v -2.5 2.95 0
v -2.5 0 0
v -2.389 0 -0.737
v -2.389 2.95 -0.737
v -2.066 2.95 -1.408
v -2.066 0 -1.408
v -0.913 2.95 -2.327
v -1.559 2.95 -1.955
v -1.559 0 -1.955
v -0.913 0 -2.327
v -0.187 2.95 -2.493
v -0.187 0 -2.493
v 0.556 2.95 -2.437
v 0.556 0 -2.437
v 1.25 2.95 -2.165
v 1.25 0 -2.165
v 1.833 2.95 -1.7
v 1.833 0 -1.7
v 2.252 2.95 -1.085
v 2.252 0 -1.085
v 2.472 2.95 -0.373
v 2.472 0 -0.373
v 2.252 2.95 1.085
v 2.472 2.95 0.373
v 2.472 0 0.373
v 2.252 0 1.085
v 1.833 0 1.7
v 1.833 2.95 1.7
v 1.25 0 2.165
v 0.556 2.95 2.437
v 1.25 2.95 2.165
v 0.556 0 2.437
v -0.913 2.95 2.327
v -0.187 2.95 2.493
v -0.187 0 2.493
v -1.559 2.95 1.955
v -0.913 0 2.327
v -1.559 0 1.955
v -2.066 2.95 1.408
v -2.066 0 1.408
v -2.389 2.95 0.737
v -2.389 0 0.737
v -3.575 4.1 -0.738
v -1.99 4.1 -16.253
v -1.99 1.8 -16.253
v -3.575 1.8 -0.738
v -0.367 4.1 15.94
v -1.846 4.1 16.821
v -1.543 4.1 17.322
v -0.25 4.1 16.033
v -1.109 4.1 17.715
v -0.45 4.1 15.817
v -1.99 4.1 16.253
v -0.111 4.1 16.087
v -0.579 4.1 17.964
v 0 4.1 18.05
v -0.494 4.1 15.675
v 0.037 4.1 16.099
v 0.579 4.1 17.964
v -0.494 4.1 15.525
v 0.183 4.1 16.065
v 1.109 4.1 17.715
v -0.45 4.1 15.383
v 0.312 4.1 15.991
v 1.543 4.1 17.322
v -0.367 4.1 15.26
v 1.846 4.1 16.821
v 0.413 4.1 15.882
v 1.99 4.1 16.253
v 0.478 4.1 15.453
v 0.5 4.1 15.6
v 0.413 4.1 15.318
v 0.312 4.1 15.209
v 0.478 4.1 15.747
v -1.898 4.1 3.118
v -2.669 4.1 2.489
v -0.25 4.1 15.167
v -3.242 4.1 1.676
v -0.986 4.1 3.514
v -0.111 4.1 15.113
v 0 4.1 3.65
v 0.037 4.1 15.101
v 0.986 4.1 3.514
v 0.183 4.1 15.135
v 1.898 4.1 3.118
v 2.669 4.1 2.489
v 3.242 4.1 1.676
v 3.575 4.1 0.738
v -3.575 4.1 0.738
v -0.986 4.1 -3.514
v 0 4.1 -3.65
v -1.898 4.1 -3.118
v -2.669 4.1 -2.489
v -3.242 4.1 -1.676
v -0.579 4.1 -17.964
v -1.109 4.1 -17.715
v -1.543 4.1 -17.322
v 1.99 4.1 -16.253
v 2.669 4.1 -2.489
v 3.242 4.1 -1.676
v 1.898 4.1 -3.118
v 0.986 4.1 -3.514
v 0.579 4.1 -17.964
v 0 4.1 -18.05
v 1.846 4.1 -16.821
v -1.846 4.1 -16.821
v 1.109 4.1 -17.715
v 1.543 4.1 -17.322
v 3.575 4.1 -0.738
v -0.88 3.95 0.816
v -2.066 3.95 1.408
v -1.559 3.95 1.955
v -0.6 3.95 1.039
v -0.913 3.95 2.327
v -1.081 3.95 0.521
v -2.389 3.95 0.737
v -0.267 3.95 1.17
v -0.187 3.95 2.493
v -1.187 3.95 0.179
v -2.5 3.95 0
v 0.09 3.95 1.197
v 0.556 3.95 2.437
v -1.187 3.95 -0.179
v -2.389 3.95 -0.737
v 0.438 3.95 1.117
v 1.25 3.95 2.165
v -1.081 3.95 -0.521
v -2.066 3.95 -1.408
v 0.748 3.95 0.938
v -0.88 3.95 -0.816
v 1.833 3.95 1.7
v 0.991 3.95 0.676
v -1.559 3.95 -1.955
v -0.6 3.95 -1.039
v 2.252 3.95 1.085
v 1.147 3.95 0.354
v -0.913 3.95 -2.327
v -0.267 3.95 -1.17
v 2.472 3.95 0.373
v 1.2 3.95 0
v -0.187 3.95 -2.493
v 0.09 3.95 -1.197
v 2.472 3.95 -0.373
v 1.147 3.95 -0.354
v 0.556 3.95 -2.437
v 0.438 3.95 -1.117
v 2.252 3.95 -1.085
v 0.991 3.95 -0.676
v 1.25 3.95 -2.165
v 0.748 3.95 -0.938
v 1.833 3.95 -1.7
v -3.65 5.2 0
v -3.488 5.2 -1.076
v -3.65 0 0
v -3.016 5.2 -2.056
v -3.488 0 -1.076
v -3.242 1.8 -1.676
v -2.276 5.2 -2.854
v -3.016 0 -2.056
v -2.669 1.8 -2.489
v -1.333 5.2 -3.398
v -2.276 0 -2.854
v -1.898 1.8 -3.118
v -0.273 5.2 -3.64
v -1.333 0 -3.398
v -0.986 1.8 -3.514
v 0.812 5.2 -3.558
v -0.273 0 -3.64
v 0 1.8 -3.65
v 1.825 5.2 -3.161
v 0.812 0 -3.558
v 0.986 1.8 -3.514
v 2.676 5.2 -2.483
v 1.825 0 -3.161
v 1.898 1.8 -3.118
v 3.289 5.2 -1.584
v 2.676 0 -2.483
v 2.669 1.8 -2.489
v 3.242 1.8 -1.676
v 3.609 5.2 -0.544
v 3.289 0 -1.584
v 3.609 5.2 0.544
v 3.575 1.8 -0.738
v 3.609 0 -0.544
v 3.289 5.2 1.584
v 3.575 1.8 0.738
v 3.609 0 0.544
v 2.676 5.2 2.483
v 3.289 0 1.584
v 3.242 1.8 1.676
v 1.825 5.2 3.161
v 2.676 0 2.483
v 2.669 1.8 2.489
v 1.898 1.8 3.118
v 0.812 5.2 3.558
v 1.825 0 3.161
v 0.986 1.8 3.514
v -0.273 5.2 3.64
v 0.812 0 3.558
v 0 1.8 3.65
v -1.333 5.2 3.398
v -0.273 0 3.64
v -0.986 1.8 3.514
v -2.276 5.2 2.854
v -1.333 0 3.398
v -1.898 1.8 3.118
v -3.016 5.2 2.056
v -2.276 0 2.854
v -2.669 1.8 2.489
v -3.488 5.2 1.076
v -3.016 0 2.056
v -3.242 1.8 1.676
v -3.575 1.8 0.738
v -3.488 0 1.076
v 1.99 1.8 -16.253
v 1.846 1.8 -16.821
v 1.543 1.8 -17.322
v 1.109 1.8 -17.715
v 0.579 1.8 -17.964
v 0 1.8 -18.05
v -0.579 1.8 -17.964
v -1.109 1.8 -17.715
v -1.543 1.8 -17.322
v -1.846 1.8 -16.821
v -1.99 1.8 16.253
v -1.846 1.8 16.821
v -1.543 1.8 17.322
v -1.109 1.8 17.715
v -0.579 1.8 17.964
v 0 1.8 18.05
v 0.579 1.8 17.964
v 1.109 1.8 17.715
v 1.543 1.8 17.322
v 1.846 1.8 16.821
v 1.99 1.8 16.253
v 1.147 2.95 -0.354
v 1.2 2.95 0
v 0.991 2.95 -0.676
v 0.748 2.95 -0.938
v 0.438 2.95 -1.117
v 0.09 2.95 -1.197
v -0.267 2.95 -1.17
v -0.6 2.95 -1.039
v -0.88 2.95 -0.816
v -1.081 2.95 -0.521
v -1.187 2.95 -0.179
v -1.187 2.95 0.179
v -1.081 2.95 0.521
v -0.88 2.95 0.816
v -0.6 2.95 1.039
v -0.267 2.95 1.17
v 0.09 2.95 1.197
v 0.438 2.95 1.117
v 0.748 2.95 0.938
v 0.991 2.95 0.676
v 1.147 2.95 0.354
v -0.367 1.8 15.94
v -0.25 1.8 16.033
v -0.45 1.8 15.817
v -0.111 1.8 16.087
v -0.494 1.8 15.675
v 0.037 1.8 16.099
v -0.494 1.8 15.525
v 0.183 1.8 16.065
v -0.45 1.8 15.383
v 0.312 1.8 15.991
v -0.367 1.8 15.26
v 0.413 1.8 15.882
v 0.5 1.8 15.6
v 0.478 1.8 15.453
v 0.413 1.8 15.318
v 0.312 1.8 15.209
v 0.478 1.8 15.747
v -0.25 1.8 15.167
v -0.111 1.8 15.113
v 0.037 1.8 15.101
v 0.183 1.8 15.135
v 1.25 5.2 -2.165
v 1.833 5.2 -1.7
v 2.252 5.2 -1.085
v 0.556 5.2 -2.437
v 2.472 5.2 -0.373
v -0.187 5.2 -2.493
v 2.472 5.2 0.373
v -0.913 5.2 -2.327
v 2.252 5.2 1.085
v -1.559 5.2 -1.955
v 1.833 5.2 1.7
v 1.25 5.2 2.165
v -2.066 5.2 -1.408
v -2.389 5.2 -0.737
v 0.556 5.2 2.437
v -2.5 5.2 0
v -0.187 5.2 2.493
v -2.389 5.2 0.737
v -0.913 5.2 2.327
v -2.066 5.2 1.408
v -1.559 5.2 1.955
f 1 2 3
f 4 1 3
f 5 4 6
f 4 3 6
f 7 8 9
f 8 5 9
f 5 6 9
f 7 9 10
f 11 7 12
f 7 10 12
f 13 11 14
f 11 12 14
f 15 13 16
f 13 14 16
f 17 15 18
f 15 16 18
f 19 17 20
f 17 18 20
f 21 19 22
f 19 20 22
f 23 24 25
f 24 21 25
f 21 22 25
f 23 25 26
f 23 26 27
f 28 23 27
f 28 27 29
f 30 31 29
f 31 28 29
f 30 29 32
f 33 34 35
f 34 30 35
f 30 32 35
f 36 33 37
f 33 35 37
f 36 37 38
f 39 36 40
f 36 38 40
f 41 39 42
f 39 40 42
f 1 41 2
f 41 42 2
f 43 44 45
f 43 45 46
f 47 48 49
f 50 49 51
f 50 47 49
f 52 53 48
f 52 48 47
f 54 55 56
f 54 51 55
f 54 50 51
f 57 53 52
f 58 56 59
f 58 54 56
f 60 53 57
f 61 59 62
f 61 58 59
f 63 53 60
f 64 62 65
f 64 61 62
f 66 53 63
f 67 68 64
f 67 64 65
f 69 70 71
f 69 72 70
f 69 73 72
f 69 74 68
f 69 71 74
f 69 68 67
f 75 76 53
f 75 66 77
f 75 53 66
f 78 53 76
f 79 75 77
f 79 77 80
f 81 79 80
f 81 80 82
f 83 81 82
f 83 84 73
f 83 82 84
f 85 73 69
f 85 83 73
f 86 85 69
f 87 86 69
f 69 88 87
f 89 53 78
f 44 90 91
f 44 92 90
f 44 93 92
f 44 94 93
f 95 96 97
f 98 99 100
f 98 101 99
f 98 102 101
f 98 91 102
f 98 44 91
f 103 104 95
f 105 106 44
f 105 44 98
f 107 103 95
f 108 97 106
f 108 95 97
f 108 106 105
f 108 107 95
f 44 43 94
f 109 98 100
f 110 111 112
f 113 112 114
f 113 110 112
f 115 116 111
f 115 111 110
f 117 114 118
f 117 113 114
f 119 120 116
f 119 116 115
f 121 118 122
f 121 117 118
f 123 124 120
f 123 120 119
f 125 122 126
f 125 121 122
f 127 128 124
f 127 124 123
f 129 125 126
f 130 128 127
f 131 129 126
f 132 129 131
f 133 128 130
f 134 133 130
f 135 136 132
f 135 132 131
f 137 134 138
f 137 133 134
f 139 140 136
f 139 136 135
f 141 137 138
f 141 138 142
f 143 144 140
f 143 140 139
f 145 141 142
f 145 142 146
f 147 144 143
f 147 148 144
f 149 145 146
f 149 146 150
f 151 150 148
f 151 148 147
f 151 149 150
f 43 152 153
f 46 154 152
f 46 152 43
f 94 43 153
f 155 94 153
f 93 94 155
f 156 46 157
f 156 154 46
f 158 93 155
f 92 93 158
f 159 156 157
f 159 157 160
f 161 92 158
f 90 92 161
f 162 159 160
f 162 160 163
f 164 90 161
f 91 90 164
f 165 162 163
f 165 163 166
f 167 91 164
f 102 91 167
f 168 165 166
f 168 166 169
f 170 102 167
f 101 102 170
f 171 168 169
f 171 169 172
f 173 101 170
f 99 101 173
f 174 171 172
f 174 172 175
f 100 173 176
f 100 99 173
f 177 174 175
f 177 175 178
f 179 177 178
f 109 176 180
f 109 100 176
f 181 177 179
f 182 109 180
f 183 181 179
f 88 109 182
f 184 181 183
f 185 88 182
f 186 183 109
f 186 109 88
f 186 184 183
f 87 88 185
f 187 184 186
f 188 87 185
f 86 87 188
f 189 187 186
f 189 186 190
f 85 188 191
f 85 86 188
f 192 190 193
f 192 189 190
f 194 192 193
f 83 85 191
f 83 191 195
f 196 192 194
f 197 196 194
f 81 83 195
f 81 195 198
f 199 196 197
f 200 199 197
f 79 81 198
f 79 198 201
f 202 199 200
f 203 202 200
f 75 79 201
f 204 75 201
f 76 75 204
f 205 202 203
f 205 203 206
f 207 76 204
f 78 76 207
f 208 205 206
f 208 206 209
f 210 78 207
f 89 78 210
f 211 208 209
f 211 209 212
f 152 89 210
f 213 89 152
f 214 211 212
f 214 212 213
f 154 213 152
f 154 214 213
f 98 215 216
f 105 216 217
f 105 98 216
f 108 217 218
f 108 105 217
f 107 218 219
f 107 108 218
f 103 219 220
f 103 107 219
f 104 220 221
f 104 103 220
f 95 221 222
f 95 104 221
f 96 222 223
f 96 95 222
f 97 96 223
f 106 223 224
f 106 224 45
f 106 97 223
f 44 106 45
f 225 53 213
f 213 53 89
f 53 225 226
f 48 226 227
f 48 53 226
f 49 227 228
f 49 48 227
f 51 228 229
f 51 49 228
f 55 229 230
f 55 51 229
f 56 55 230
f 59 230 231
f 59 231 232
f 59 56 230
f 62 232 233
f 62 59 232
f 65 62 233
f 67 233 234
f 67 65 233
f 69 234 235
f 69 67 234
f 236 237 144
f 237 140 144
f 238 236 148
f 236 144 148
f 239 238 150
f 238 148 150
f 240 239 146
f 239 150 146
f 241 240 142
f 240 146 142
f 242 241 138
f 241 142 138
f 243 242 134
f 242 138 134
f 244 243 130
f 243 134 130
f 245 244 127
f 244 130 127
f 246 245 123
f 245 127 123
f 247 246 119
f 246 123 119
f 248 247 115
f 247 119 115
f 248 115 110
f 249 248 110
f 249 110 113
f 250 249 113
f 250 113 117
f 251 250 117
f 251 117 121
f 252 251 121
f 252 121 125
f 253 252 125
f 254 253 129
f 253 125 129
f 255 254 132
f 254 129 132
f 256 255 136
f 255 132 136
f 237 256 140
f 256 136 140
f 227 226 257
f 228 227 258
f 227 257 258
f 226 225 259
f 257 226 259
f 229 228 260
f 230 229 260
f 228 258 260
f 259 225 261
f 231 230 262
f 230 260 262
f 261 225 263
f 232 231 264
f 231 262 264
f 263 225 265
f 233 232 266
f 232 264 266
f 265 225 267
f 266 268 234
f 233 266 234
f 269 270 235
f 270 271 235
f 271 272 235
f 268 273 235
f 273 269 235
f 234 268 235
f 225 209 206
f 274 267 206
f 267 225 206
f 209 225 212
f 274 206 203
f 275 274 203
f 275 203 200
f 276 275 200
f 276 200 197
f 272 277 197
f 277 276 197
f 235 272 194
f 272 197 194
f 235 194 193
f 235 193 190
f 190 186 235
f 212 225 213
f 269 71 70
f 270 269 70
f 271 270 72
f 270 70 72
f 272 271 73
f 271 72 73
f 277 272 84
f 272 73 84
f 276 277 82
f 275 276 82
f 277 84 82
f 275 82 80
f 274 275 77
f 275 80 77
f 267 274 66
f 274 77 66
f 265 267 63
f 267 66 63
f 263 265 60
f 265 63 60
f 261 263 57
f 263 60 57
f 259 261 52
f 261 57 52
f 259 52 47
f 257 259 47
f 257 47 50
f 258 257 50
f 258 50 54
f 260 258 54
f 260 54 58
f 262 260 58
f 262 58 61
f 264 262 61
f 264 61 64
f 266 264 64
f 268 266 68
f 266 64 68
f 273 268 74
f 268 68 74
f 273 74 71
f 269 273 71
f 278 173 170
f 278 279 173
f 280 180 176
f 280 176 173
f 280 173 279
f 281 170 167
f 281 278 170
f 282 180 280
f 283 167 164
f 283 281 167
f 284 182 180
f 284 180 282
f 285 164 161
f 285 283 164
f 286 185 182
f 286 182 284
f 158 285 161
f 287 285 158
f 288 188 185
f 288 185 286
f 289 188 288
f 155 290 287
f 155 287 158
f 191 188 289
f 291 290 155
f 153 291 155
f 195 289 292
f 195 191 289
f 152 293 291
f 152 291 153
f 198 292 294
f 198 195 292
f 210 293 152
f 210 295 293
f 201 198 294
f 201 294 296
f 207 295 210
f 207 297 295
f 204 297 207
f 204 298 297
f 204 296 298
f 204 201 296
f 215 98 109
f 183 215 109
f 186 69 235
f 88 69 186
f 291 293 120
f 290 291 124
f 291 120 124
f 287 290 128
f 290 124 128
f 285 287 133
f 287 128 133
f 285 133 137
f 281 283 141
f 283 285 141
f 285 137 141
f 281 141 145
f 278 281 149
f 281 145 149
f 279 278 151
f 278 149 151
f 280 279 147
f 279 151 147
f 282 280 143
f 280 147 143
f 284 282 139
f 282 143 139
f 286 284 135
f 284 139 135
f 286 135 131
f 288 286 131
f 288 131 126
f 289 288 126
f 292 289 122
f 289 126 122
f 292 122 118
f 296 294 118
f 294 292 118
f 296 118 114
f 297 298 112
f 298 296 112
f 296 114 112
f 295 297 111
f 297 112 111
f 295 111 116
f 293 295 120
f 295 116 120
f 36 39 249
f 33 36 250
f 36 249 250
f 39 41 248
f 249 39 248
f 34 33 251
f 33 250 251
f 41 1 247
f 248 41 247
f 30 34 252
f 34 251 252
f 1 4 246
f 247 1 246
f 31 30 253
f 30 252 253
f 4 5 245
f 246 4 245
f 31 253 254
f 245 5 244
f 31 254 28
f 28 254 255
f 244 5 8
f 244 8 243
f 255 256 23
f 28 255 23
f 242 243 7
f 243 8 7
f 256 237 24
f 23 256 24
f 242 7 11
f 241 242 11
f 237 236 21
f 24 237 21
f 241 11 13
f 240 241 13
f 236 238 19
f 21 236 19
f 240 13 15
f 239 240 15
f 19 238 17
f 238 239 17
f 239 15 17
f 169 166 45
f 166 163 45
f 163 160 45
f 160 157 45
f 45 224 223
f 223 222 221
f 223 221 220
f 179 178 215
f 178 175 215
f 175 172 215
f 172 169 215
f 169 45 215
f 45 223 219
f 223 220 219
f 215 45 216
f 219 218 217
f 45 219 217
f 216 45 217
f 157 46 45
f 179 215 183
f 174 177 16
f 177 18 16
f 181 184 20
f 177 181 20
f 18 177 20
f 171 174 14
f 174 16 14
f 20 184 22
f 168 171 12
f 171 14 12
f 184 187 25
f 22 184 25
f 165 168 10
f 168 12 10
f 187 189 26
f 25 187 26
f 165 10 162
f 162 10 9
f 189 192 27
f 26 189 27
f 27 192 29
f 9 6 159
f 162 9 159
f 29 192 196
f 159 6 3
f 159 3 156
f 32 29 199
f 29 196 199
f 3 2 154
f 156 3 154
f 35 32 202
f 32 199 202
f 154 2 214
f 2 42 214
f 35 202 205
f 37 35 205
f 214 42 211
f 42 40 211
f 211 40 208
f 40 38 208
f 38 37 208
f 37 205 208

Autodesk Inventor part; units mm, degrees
ref_plane "YZ Plane" through (0, 0, 0) normal (1, 0, 0) x (0, 1, 0)
sketch "Sketch1" plane through (0, 0, 0) normal (0, 1, 0) x (-1, 0, 0)
  circle A0 centre (0, 0) radius 2.5
  circle A1 centre (0, 0) radius 3.65
  dimension "d0" = 5
  dimension "d1" = 7.3
extrude "Extrusion1" add sketch "Sketch1" along normal blind 5.2
ref_plane "Work Plane1" through (0, 3.95, 0) normal (0, 1, 0) x (1, 0, 0)
sketch "Sketch2" plane through (0, 3.95, 0) normal (0, 1, 0) x (1, 0, 0)
  circle A0 centre (0, 0) radius 2.5 projected
  circle A1 centre (0, 0) radius 1.2
  dimension "d5" = 2.4
extrude "Extrusion2" add sketch "Sketch2" against normal blind 1
ref_plane "Work Plane2" through (0, 4.1, 0) normal (0, 1, 0) x (1, 0, 0)
sketch "Sketch3" plane through (0, 4.1, 0) normal (0, 1, 0) x (1, 0, 0)
  line L0 (5.5656, 0) -> (-5.5656, 0) construction
  circle A0 centre (0, 16.05) radius 2
  line L1 (1.9896, 16.2533) -> (3.65, 0)
  circle A1 centre (0, 0) radius 3.65 projected
  line L2 (-1.9896, 16.2533) -> (-3.65, 0)
  line L3 (0, 16.05) -> (0, 18.05)
  line L4 (0, 3.65) -> (0, -3.65) construction
  circle A2 centre (0, -16.05) radius 2
  line L5 (1.9896, -16.2533) -> (3.65, 0)
  line L6 (-1.9896, -16.2533) -> (-3.65, 0)
  line L7 (0, -16.05) -> (0, -18.05)
  point P0 (0, 0)
  point P1 (-3.5746, -0.738)
  point P2 (3.5746, -0.738)
  point P3 (-3.5746, 0.738)
  point P4 (3.5746, 0.738)
  dimension "d9" = 18.05
  dimension "d10" = 4
extrude "Extrusion3" add sketch "Sketch3" against normal blind 2.3 contours A0 | A0 L1 A1 L2 | L5 A2 L6 A1 | A2
sketch "Sketch4" plane through (0, 4.1, 0) normal (0, 1, 0) x (1, 0, 0)
  circle A0 centre (0, -15.6) radius 0.5
  point P0 (0, 0)
  dimension "d13" = 1
  dimension "d14" = 15.6
extrude "Extrusion4" cut sketch "Sketch4" against normal through all
properties part number "Servo_small_top"
